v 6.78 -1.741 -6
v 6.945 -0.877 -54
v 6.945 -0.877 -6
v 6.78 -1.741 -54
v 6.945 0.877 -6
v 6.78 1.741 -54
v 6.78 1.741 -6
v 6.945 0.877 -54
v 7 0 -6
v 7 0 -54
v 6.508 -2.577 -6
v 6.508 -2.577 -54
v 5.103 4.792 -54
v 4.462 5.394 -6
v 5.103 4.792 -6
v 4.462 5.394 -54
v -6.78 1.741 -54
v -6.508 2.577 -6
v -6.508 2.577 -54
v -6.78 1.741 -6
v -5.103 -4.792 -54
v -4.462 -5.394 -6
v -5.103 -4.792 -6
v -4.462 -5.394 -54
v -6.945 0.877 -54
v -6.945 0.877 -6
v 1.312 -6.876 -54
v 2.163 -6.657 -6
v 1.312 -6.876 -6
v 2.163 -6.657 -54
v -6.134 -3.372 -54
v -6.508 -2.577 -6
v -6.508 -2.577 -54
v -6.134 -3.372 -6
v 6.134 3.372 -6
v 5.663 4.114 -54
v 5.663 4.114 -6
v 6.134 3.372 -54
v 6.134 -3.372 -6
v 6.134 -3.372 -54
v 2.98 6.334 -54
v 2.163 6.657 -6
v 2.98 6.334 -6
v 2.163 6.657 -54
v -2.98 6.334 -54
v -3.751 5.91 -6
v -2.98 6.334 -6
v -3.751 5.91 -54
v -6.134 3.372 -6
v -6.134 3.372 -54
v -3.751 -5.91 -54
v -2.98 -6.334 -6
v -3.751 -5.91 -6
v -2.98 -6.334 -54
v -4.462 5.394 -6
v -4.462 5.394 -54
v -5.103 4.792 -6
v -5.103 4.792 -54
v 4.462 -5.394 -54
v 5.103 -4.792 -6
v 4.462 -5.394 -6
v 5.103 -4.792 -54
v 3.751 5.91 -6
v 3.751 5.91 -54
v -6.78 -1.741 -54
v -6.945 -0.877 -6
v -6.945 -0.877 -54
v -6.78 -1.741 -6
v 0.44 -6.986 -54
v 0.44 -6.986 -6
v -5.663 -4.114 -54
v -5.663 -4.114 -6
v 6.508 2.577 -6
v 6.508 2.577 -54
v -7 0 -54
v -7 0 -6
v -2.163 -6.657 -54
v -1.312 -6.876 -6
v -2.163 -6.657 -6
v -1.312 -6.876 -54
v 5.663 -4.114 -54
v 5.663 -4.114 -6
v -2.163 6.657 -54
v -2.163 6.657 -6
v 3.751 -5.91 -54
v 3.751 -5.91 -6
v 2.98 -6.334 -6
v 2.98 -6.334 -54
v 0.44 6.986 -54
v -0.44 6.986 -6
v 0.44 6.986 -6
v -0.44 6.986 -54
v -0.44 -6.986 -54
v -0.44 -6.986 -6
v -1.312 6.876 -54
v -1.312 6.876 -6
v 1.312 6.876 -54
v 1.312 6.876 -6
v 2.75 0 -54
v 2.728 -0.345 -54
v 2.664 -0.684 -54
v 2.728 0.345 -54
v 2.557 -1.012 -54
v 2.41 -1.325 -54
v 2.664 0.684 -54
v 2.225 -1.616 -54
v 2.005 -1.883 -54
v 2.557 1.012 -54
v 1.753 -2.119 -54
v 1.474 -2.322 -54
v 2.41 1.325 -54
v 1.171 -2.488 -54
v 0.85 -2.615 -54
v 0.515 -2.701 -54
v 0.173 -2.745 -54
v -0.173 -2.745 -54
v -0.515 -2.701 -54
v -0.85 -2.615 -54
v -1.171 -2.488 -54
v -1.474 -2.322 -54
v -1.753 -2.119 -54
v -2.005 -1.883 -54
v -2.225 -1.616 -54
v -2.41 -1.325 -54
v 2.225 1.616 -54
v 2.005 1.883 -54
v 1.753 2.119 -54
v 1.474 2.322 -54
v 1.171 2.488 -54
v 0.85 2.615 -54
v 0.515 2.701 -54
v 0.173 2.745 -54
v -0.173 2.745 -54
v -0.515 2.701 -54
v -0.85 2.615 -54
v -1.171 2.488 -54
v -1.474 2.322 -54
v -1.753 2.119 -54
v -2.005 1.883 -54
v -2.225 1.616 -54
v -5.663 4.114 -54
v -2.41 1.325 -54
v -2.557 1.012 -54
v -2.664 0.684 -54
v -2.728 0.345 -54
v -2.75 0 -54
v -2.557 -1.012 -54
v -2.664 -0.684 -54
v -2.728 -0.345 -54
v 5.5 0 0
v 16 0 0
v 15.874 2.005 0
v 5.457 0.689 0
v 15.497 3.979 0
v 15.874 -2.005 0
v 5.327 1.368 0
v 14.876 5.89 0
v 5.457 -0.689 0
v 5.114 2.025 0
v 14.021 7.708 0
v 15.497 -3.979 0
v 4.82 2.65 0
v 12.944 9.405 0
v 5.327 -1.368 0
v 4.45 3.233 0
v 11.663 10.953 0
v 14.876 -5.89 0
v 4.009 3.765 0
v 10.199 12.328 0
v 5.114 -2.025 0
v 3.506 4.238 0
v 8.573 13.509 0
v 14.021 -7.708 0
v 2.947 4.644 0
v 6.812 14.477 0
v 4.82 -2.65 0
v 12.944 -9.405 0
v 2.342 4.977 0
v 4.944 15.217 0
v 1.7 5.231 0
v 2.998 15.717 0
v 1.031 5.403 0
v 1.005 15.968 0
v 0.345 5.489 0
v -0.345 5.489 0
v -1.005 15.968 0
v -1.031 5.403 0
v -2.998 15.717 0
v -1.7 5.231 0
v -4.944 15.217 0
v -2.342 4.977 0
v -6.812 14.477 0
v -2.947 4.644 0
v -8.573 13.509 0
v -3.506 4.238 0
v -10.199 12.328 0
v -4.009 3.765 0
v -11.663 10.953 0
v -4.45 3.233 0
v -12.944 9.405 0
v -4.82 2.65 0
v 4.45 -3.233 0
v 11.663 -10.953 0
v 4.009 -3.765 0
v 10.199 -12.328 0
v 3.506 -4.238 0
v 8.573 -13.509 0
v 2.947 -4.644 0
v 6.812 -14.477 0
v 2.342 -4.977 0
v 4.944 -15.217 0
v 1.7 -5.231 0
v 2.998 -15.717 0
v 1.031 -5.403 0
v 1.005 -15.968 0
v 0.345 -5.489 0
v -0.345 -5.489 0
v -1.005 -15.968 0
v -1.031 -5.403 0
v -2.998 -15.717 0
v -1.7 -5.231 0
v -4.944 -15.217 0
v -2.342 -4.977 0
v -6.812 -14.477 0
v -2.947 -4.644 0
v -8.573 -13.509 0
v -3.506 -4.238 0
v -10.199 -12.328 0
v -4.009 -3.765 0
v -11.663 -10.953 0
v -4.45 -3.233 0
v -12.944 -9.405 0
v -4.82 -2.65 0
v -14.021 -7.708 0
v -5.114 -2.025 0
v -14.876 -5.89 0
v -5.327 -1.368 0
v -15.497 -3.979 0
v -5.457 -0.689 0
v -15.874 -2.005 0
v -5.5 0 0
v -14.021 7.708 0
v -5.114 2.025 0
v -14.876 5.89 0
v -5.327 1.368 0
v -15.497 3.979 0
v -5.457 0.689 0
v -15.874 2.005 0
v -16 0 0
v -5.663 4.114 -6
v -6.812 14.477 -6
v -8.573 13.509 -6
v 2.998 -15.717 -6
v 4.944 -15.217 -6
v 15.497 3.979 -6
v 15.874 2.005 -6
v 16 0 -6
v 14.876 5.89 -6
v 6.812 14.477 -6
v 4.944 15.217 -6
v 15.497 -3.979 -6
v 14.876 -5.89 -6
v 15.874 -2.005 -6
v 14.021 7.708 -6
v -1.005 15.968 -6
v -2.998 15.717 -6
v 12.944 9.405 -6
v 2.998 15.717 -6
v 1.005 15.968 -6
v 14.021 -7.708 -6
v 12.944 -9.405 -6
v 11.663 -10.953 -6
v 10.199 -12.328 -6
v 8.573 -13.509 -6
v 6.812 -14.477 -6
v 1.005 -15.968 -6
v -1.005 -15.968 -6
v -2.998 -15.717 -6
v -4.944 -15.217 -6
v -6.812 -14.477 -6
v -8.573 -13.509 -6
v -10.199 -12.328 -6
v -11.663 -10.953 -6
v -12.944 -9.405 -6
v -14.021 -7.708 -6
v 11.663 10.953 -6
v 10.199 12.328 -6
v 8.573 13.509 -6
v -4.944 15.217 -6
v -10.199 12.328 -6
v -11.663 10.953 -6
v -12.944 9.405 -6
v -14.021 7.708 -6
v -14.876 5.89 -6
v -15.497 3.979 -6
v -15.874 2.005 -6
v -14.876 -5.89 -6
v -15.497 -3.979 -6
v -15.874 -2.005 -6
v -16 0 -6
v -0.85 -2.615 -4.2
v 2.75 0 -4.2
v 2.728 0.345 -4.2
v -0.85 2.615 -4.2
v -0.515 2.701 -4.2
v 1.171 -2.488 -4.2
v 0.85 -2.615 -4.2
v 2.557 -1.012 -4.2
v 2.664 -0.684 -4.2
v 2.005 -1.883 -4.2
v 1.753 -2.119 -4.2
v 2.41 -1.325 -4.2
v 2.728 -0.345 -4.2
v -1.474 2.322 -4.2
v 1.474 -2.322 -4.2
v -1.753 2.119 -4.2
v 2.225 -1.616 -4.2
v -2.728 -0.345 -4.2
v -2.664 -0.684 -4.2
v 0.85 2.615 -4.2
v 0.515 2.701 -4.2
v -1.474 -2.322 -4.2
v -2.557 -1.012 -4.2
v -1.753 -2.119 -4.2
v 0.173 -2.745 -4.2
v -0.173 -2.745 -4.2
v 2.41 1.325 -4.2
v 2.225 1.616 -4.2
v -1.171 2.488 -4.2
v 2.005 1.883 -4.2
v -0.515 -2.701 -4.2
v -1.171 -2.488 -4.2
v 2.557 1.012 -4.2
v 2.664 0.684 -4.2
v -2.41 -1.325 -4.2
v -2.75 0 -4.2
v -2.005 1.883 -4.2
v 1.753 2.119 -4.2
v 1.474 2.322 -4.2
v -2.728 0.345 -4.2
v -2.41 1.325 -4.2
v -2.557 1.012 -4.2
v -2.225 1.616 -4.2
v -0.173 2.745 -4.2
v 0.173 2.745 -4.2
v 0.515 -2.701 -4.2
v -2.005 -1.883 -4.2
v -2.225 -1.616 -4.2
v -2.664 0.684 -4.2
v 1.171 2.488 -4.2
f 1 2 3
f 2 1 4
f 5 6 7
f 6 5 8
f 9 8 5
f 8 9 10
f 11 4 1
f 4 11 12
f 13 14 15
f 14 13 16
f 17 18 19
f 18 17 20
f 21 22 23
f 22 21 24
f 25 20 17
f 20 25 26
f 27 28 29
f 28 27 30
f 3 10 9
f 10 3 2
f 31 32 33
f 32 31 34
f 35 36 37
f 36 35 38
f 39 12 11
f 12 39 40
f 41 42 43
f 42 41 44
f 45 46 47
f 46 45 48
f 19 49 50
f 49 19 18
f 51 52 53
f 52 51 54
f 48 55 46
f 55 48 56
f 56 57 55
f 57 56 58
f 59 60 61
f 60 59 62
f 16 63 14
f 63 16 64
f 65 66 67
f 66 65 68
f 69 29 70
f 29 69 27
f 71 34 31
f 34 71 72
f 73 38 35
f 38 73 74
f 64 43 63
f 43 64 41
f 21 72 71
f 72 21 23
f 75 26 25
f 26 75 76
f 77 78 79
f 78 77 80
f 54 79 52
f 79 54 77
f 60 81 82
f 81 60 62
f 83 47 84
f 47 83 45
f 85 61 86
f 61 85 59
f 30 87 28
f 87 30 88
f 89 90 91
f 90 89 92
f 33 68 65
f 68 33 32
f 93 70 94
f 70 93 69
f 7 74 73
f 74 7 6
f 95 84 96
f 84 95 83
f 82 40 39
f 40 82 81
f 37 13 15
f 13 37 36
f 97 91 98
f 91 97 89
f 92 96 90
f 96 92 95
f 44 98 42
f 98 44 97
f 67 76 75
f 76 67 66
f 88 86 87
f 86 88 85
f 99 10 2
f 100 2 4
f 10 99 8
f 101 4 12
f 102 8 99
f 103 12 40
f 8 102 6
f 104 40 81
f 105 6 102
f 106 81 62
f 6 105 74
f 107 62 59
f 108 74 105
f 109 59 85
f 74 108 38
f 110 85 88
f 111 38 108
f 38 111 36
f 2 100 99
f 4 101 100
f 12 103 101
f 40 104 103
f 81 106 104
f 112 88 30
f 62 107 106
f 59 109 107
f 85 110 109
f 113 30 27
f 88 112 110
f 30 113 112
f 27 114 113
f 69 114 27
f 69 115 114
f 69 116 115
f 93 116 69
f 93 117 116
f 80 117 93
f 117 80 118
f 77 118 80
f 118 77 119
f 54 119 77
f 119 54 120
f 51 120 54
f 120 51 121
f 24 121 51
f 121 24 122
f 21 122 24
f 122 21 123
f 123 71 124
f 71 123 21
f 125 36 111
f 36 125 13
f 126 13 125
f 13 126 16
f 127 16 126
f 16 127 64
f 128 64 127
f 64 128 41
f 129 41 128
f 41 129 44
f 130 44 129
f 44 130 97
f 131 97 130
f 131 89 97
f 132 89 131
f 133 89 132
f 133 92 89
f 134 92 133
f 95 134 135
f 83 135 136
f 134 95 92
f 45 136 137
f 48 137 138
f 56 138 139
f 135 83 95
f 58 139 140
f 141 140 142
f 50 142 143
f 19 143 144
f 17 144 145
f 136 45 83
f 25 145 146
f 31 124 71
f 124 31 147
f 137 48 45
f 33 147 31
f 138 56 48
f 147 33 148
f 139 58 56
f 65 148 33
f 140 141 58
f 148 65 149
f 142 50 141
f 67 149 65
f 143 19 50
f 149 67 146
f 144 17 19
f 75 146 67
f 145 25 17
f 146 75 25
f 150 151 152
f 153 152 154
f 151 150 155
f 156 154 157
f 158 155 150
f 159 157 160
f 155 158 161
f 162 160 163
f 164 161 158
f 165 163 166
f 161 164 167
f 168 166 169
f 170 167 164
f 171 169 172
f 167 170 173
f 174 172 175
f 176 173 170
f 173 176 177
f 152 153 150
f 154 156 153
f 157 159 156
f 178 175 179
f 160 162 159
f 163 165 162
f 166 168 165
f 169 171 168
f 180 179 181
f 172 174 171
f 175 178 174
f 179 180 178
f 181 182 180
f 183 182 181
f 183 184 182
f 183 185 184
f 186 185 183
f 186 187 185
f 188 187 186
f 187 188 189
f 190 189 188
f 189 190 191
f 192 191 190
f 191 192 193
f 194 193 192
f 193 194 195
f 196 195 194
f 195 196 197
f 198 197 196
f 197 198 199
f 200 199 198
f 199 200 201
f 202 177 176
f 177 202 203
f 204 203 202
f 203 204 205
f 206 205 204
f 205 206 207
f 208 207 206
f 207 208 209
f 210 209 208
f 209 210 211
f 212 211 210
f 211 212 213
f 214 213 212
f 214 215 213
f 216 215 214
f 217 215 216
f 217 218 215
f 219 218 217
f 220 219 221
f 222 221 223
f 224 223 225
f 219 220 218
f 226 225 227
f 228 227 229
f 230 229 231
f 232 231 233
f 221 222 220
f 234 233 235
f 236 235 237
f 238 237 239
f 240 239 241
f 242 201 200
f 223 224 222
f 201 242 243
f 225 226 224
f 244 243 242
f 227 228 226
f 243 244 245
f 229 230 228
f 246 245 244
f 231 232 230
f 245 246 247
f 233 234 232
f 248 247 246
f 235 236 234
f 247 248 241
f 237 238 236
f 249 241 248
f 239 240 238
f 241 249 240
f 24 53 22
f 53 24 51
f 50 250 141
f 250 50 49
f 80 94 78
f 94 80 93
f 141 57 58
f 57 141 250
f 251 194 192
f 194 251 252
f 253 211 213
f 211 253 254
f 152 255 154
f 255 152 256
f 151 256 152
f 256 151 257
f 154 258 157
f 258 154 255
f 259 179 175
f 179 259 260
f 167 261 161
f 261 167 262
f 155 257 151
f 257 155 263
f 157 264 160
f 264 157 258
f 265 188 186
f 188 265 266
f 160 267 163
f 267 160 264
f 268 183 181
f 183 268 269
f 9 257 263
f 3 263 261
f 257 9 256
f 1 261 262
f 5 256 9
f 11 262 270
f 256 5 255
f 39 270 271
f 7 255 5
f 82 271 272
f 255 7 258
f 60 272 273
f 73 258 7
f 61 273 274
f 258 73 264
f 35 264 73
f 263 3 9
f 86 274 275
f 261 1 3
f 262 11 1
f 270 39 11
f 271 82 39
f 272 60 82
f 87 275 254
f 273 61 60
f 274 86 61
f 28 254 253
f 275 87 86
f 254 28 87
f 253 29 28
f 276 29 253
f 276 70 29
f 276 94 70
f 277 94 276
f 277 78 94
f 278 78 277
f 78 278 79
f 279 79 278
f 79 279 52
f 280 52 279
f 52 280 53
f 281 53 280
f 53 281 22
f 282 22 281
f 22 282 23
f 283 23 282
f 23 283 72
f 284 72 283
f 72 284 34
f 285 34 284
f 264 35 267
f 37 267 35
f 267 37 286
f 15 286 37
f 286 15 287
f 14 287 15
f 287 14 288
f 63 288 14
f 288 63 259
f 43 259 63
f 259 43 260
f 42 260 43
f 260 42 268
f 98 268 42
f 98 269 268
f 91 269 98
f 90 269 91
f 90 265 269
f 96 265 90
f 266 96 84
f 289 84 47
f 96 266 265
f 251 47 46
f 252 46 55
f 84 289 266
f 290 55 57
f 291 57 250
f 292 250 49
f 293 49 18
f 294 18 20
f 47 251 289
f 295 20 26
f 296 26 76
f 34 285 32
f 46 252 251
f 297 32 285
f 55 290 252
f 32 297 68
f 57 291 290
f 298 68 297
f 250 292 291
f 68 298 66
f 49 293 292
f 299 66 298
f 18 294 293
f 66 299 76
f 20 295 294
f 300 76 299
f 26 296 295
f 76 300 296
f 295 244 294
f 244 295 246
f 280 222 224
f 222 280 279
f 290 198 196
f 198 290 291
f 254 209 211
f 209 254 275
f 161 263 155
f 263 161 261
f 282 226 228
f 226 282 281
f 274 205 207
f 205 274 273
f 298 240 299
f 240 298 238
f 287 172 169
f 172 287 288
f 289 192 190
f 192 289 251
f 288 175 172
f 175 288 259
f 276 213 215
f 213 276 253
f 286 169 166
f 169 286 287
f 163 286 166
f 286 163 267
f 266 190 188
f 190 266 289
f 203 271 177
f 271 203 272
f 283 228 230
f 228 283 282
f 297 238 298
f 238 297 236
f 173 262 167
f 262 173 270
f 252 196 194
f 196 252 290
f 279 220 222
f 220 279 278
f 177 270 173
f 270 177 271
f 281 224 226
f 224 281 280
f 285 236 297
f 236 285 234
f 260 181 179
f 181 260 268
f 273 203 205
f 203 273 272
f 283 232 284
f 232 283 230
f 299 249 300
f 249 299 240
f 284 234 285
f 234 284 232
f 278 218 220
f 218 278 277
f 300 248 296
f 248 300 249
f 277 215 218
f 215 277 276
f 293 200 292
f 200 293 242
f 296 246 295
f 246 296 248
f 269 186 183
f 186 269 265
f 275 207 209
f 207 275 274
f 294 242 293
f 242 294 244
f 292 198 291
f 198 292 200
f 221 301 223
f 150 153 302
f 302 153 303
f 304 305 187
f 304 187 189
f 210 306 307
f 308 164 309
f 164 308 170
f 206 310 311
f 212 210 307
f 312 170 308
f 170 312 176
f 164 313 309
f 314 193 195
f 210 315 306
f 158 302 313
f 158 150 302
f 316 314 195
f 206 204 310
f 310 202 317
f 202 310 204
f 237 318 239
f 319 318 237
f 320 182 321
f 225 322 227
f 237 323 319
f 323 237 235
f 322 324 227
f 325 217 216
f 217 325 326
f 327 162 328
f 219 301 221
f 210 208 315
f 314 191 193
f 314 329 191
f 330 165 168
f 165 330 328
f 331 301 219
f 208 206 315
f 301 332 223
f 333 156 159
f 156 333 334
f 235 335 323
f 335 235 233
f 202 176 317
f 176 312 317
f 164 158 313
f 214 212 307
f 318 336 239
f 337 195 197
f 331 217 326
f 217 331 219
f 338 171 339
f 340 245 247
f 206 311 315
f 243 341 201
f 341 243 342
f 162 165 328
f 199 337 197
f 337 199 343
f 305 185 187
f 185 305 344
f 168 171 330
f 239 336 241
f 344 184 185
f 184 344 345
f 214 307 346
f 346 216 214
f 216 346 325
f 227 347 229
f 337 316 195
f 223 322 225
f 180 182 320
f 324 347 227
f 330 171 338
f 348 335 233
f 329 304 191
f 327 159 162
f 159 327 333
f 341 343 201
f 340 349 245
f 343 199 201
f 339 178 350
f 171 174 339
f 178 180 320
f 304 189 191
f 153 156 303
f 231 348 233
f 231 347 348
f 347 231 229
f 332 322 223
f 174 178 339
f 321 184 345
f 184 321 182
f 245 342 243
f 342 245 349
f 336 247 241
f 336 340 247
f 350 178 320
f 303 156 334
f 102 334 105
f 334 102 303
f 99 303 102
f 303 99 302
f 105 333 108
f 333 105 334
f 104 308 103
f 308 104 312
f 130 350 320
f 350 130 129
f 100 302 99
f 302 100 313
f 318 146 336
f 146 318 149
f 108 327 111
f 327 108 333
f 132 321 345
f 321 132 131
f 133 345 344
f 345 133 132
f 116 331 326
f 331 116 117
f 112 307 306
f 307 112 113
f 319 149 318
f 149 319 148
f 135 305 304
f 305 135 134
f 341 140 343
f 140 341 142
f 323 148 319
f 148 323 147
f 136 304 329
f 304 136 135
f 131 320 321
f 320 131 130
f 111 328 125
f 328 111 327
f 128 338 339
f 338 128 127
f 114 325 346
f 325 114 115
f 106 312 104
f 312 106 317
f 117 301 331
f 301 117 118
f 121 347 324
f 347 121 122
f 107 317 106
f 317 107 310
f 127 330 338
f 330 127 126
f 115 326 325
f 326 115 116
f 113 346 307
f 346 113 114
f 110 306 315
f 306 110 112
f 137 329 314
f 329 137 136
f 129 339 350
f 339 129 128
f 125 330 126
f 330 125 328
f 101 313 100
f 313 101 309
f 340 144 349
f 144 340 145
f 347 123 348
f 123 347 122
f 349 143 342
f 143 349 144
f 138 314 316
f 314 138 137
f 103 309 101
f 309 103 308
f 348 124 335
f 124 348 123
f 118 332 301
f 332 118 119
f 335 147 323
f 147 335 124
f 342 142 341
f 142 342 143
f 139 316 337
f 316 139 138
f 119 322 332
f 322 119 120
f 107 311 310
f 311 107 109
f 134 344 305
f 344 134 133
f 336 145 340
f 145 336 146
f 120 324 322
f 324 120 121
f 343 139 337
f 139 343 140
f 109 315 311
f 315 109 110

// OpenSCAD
$fn = 50;


difference() {
	union() {
		translate(v = [0, 0, -54.0000000000]) {
			cylinder(h = 54, r = 7.0000000000);
		}
		translate(v = [0, 0, -6.0000000000]) {
			cylinder(h = 6, r = 16.0000000000);
		}
	}
	union() {
		translate(v = [0, 0, 0]) {
			rotate(a = [0, 0, 0]) {
				difference() {
					union() {
						#translate(v = [0, 0, -54.0000000000]) {
							cylinder(h = 54, r = 2.2500000000);
						}
						#translate(v = [0, 0, -4.2000000000]) {
							cylinder(h = 4.2000000000, r1 = 2.7500000000, r2 = 5.5000000000);
						}
						#translate(v = [0, 0, -54.0000000000]) {
							cylinder(h = 54, r = 2.7500000000);
						}
						#translate(v = [0, 0, -54.0000000000]) {
							cylinder(h = 54, r = 2.2500000000);
						}
					}
					union();
				}
			}
		}
	}
}
